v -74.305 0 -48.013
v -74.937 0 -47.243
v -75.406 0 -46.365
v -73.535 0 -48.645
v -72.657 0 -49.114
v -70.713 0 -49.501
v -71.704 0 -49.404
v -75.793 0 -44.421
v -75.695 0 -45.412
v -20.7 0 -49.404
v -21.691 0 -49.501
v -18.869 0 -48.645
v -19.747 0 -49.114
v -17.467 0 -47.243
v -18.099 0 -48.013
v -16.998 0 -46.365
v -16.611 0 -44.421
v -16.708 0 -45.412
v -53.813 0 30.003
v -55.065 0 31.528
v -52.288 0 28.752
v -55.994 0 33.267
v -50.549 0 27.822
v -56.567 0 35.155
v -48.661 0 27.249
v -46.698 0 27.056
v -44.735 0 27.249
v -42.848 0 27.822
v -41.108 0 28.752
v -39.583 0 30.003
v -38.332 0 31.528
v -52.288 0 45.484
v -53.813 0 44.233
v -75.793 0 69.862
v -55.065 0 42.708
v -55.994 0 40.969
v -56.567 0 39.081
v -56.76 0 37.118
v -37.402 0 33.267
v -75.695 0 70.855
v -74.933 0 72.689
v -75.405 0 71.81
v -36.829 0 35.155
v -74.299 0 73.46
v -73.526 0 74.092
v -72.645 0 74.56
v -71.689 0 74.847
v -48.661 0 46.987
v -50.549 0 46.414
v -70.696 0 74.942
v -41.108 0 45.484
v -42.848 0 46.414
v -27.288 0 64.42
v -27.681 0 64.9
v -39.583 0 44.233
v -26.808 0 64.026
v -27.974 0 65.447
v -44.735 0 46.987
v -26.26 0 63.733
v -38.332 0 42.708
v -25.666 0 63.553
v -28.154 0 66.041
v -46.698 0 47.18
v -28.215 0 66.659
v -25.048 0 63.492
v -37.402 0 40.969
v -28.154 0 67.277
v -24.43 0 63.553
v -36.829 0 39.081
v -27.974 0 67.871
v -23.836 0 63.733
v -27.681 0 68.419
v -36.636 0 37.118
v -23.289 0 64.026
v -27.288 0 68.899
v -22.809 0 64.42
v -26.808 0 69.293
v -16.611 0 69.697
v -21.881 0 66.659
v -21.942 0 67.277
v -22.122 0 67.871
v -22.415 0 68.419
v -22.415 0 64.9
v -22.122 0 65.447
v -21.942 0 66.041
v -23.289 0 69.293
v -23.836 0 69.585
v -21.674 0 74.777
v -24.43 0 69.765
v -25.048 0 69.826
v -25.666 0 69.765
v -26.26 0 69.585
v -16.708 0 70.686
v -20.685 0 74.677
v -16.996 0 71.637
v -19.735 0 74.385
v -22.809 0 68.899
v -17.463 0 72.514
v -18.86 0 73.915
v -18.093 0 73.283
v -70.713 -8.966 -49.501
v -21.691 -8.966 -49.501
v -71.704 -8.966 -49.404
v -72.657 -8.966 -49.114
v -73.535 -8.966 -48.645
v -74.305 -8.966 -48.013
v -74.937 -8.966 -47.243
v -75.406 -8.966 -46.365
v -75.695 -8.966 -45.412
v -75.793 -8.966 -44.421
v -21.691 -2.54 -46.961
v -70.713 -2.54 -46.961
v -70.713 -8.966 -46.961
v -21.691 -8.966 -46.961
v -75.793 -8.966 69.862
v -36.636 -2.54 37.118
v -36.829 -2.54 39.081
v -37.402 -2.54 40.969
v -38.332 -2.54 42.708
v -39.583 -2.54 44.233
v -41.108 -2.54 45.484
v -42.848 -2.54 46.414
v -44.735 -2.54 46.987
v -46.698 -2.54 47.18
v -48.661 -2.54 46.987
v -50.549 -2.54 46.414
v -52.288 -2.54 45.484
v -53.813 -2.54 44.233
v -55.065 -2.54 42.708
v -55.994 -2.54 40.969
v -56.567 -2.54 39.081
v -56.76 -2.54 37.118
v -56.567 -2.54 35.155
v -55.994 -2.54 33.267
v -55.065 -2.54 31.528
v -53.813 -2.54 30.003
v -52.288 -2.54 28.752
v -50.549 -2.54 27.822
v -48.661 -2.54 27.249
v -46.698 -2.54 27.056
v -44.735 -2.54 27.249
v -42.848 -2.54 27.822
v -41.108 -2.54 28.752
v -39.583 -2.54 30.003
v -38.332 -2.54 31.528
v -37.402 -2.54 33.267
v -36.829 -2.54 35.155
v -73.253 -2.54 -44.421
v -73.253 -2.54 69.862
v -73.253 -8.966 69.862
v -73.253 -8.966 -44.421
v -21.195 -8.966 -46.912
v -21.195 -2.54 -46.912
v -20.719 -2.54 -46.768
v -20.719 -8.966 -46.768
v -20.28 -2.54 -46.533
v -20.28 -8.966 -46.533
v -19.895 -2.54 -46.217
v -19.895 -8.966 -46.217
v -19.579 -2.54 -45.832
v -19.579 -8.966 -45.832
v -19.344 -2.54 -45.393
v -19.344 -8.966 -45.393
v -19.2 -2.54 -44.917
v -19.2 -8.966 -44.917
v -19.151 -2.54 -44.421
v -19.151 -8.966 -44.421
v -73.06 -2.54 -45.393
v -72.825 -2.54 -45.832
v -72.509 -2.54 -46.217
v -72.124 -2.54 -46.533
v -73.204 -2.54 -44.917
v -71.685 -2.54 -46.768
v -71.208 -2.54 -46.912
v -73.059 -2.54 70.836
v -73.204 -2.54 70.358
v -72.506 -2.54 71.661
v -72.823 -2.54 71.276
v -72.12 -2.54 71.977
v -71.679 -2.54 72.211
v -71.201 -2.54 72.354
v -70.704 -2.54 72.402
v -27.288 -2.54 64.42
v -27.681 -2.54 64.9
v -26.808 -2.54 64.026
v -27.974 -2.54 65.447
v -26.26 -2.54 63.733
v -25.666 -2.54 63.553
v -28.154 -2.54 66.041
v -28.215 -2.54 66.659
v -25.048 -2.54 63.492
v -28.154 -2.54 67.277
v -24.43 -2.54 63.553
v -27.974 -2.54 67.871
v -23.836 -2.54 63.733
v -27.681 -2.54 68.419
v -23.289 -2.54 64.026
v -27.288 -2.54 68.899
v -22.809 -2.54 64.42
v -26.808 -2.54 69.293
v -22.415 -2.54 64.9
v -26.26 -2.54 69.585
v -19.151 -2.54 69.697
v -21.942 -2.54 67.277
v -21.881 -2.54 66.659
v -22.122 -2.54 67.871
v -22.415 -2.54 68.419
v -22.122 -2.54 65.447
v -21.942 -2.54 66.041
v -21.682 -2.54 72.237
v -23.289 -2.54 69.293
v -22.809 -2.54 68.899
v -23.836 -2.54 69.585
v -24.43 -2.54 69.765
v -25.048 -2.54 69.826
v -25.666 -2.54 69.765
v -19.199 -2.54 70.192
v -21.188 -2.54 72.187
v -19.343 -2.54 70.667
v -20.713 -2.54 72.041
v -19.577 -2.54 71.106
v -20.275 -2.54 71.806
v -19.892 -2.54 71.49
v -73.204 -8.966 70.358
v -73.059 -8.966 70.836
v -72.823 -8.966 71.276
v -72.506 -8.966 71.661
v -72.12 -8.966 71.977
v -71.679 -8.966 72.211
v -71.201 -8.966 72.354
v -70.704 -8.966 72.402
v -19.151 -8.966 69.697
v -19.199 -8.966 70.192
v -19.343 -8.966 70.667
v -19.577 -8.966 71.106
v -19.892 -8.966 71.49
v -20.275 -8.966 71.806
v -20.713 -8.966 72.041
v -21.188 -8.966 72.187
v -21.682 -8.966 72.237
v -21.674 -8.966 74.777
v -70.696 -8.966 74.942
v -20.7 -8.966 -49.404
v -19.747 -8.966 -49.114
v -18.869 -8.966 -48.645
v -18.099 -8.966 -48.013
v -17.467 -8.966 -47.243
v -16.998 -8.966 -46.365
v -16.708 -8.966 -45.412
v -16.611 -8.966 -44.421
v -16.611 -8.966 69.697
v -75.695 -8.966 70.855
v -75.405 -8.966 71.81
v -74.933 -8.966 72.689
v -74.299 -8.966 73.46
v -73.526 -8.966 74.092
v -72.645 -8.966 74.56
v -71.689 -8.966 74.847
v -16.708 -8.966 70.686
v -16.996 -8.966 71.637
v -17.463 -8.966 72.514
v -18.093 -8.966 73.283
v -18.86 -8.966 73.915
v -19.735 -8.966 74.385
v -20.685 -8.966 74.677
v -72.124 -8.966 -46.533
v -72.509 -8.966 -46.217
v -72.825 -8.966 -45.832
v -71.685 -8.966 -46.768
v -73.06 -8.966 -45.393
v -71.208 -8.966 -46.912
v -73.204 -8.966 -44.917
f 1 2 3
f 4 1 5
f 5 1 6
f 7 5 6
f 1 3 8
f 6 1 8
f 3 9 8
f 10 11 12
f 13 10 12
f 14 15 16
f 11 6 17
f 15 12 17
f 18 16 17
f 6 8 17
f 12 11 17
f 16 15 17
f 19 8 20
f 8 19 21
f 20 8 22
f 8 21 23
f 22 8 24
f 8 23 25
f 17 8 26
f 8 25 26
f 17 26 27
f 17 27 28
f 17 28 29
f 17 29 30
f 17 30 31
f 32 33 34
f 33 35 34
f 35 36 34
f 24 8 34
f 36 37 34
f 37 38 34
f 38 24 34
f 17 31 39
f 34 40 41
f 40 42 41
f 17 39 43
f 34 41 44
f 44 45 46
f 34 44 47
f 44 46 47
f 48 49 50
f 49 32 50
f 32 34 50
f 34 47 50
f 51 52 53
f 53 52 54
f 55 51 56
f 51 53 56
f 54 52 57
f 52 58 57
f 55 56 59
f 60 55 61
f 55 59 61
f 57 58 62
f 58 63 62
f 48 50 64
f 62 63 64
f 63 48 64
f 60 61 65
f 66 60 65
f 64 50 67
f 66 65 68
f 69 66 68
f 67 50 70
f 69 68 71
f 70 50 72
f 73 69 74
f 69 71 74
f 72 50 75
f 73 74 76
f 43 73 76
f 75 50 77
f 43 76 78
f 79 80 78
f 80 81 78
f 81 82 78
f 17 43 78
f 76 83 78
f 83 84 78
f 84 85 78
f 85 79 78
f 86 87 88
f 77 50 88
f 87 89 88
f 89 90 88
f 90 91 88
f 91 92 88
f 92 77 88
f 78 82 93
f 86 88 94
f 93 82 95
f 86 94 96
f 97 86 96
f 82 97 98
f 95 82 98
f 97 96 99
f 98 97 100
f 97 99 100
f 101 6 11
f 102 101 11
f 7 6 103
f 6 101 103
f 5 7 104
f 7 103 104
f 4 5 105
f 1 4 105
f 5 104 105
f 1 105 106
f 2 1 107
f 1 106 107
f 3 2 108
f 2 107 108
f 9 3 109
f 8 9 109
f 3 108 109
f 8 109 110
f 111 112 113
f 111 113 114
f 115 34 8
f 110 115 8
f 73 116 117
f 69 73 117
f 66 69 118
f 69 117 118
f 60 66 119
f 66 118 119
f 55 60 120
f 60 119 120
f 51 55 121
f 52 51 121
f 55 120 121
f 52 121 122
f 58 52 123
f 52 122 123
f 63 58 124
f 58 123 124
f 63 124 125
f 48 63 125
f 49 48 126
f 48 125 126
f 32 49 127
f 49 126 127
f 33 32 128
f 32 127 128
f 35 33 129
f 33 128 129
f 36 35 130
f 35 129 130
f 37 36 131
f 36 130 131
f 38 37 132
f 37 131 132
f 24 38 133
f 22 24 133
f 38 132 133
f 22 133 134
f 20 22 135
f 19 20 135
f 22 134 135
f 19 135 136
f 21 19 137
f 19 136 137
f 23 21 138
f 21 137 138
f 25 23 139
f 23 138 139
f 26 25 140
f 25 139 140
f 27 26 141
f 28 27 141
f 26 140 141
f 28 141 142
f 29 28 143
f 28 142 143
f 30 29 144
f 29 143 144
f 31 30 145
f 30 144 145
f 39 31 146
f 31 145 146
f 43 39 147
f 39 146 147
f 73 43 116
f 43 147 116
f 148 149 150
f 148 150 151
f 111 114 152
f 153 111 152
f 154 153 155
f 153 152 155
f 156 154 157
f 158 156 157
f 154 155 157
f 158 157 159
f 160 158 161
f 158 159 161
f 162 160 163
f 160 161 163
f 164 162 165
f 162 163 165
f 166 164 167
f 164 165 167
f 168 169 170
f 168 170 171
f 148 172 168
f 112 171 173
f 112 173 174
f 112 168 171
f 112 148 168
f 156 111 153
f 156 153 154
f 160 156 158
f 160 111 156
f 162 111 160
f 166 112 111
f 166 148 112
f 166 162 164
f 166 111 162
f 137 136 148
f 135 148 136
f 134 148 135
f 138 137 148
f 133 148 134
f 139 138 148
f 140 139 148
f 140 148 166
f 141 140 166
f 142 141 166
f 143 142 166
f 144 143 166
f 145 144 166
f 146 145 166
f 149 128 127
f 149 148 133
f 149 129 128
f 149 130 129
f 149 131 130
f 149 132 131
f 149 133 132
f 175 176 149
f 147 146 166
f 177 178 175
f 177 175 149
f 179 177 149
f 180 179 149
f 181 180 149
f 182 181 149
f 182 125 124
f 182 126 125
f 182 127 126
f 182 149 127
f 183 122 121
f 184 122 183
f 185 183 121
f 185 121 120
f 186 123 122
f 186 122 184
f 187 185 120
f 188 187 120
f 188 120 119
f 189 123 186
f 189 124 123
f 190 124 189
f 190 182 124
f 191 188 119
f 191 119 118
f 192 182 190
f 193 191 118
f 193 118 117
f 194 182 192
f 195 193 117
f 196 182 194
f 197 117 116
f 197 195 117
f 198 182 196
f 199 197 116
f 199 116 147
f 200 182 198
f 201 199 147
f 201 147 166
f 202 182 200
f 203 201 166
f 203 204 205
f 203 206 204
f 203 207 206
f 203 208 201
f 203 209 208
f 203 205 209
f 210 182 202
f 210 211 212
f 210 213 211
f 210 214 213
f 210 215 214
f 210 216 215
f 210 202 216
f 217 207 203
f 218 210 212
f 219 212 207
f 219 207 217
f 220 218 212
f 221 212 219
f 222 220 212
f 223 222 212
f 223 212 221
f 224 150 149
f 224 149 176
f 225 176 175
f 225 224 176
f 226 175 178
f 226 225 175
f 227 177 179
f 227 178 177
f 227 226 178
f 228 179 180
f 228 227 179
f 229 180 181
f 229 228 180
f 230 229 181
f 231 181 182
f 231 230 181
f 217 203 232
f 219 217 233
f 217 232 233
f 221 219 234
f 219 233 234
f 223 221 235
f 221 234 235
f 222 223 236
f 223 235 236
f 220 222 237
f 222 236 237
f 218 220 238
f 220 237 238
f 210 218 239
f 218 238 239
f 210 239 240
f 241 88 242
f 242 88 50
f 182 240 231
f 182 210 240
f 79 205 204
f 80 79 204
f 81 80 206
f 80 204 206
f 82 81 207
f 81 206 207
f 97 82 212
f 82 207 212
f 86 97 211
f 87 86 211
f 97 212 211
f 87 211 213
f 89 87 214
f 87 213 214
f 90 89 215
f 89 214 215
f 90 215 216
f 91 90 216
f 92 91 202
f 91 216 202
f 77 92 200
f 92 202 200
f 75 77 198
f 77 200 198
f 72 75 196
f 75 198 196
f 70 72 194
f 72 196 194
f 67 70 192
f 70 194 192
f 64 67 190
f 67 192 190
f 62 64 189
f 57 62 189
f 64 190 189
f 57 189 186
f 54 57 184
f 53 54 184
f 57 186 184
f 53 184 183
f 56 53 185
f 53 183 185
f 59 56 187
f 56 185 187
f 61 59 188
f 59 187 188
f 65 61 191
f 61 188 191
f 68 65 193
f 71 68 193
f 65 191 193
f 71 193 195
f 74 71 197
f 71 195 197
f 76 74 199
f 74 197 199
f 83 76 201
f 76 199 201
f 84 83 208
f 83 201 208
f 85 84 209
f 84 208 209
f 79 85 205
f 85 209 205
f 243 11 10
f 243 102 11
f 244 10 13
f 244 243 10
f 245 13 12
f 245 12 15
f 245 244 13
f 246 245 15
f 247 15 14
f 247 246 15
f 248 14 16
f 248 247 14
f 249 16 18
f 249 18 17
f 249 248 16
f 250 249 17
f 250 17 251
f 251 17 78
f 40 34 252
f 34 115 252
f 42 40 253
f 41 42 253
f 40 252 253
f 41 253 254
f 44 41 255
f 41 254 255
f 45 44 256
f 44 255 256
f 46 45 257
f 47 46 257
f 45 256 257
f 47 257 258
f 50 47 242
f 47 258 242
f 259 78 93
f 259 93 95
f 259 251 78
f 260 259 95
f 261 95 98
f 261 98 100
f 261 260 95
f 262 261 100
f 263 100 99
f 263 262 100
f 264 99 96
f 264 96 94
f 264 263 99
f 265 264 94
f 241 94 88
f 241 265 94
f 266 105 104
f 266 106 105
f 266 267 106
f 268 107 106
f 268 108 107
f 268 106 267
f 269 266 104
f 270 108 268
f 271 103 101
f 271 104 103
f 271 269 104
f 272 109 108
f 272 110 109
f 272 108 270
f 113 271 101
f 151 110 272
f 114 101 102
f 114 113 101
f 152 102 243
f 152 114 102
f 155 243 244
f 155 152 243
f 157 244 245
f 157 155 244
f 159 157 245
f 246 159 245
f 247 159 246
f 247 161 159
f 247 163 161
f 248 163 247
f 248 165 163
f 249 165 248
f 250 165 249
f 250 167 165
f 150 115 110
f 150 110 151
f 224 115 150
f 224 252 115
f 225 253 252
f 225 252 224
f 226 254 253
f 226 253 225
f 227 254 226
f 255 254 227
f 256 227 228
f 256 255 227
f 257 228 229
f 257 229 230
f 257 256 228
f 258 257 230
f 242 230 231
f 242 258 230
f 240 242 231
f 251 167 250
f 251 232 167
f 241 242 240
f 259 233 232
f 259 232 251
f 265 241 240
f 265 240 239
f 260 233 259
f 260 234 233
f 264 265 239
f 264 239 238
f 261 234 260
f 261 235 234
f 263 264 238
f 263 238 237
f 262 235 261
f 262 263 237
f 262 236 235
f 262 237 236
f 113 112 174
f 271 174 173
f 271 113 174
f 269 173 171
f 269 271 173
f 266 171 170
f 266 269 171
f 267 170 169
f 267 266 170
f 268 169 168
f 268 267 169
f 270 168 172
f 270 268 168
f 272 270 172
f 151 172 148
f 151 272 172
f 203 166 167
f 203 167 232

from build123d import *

# Parameters (mm, degrees)
F1_DEPTH = 8.9662
F2_R     = 5.08
F3_R     = 5.08
F4_R     = 3.1670818849
F5_DEPTH = 25.4
F6_R     = 10.0620941007
F7_DEPTH = 25.4
F8_T     = -2.54


with BuildPart() as f1:
    # F0 (on Front) → F1 (new body)
    with BuildSketch(Plane.XZ):
        Polygon((-75.792866245, 74.9588643271), (-75.792866245, -49.5011356729), (-16.610866245, -49.5011356729), (-16.610866245, 74.7600470389), align=None)
    extrude(amount=F1_DEPTH)

    # F2
    f2_edges = [f1.edges().sort_by_distance(p)[0] for p in [
        (-16.610866, -4.4831, 74.760047),
        (-16.610866, -4.4831, -49.501136),
    ]]
    fillet(f2_edges, radius=F2_R)

    # F3
    f3_edges = [f1.edges().sort_by_distance(p)[0] for p in [
        (-75.792866, -4.4831, 74.958864),
        (-75.792866, -4.4831, -49.501136),
    ]]
    fillet(f3_edges, radius=F3_R)

    # F4 (on face) → F5 (cut)
    with BuildSketch(Plane.XZ.offset(8.9662)):
        with Locations((-25.0480864197, 66.6592344642)):
            Circle(F4_R)
    extrude(amount=-F5_DEPTH, mode=Mode.SUBTRACT)

    # F6 (on face) → F7 (cut)
    with BuildSketch(Plane.XZ.offset(8.9662)):
        with Locations((-46.6981939971, 37.1179692447)):
            Circle(F6_R)
    extrude(amount=-F7_DEPTH, mode=Mode.SUBTRACT)

    # F8
    f8_openings = [f1.faces().sort_by_distance(p)[0] for p in [
        (-46.282621, -8.9662, 11.323406),
        (-56.760288, -4.4831, 37.117969),
        (-28.215168, -4.4831, 66.659234),
    ]]
    offset(amount=F8_T, openings=f8_openings)


solid = f1.part
